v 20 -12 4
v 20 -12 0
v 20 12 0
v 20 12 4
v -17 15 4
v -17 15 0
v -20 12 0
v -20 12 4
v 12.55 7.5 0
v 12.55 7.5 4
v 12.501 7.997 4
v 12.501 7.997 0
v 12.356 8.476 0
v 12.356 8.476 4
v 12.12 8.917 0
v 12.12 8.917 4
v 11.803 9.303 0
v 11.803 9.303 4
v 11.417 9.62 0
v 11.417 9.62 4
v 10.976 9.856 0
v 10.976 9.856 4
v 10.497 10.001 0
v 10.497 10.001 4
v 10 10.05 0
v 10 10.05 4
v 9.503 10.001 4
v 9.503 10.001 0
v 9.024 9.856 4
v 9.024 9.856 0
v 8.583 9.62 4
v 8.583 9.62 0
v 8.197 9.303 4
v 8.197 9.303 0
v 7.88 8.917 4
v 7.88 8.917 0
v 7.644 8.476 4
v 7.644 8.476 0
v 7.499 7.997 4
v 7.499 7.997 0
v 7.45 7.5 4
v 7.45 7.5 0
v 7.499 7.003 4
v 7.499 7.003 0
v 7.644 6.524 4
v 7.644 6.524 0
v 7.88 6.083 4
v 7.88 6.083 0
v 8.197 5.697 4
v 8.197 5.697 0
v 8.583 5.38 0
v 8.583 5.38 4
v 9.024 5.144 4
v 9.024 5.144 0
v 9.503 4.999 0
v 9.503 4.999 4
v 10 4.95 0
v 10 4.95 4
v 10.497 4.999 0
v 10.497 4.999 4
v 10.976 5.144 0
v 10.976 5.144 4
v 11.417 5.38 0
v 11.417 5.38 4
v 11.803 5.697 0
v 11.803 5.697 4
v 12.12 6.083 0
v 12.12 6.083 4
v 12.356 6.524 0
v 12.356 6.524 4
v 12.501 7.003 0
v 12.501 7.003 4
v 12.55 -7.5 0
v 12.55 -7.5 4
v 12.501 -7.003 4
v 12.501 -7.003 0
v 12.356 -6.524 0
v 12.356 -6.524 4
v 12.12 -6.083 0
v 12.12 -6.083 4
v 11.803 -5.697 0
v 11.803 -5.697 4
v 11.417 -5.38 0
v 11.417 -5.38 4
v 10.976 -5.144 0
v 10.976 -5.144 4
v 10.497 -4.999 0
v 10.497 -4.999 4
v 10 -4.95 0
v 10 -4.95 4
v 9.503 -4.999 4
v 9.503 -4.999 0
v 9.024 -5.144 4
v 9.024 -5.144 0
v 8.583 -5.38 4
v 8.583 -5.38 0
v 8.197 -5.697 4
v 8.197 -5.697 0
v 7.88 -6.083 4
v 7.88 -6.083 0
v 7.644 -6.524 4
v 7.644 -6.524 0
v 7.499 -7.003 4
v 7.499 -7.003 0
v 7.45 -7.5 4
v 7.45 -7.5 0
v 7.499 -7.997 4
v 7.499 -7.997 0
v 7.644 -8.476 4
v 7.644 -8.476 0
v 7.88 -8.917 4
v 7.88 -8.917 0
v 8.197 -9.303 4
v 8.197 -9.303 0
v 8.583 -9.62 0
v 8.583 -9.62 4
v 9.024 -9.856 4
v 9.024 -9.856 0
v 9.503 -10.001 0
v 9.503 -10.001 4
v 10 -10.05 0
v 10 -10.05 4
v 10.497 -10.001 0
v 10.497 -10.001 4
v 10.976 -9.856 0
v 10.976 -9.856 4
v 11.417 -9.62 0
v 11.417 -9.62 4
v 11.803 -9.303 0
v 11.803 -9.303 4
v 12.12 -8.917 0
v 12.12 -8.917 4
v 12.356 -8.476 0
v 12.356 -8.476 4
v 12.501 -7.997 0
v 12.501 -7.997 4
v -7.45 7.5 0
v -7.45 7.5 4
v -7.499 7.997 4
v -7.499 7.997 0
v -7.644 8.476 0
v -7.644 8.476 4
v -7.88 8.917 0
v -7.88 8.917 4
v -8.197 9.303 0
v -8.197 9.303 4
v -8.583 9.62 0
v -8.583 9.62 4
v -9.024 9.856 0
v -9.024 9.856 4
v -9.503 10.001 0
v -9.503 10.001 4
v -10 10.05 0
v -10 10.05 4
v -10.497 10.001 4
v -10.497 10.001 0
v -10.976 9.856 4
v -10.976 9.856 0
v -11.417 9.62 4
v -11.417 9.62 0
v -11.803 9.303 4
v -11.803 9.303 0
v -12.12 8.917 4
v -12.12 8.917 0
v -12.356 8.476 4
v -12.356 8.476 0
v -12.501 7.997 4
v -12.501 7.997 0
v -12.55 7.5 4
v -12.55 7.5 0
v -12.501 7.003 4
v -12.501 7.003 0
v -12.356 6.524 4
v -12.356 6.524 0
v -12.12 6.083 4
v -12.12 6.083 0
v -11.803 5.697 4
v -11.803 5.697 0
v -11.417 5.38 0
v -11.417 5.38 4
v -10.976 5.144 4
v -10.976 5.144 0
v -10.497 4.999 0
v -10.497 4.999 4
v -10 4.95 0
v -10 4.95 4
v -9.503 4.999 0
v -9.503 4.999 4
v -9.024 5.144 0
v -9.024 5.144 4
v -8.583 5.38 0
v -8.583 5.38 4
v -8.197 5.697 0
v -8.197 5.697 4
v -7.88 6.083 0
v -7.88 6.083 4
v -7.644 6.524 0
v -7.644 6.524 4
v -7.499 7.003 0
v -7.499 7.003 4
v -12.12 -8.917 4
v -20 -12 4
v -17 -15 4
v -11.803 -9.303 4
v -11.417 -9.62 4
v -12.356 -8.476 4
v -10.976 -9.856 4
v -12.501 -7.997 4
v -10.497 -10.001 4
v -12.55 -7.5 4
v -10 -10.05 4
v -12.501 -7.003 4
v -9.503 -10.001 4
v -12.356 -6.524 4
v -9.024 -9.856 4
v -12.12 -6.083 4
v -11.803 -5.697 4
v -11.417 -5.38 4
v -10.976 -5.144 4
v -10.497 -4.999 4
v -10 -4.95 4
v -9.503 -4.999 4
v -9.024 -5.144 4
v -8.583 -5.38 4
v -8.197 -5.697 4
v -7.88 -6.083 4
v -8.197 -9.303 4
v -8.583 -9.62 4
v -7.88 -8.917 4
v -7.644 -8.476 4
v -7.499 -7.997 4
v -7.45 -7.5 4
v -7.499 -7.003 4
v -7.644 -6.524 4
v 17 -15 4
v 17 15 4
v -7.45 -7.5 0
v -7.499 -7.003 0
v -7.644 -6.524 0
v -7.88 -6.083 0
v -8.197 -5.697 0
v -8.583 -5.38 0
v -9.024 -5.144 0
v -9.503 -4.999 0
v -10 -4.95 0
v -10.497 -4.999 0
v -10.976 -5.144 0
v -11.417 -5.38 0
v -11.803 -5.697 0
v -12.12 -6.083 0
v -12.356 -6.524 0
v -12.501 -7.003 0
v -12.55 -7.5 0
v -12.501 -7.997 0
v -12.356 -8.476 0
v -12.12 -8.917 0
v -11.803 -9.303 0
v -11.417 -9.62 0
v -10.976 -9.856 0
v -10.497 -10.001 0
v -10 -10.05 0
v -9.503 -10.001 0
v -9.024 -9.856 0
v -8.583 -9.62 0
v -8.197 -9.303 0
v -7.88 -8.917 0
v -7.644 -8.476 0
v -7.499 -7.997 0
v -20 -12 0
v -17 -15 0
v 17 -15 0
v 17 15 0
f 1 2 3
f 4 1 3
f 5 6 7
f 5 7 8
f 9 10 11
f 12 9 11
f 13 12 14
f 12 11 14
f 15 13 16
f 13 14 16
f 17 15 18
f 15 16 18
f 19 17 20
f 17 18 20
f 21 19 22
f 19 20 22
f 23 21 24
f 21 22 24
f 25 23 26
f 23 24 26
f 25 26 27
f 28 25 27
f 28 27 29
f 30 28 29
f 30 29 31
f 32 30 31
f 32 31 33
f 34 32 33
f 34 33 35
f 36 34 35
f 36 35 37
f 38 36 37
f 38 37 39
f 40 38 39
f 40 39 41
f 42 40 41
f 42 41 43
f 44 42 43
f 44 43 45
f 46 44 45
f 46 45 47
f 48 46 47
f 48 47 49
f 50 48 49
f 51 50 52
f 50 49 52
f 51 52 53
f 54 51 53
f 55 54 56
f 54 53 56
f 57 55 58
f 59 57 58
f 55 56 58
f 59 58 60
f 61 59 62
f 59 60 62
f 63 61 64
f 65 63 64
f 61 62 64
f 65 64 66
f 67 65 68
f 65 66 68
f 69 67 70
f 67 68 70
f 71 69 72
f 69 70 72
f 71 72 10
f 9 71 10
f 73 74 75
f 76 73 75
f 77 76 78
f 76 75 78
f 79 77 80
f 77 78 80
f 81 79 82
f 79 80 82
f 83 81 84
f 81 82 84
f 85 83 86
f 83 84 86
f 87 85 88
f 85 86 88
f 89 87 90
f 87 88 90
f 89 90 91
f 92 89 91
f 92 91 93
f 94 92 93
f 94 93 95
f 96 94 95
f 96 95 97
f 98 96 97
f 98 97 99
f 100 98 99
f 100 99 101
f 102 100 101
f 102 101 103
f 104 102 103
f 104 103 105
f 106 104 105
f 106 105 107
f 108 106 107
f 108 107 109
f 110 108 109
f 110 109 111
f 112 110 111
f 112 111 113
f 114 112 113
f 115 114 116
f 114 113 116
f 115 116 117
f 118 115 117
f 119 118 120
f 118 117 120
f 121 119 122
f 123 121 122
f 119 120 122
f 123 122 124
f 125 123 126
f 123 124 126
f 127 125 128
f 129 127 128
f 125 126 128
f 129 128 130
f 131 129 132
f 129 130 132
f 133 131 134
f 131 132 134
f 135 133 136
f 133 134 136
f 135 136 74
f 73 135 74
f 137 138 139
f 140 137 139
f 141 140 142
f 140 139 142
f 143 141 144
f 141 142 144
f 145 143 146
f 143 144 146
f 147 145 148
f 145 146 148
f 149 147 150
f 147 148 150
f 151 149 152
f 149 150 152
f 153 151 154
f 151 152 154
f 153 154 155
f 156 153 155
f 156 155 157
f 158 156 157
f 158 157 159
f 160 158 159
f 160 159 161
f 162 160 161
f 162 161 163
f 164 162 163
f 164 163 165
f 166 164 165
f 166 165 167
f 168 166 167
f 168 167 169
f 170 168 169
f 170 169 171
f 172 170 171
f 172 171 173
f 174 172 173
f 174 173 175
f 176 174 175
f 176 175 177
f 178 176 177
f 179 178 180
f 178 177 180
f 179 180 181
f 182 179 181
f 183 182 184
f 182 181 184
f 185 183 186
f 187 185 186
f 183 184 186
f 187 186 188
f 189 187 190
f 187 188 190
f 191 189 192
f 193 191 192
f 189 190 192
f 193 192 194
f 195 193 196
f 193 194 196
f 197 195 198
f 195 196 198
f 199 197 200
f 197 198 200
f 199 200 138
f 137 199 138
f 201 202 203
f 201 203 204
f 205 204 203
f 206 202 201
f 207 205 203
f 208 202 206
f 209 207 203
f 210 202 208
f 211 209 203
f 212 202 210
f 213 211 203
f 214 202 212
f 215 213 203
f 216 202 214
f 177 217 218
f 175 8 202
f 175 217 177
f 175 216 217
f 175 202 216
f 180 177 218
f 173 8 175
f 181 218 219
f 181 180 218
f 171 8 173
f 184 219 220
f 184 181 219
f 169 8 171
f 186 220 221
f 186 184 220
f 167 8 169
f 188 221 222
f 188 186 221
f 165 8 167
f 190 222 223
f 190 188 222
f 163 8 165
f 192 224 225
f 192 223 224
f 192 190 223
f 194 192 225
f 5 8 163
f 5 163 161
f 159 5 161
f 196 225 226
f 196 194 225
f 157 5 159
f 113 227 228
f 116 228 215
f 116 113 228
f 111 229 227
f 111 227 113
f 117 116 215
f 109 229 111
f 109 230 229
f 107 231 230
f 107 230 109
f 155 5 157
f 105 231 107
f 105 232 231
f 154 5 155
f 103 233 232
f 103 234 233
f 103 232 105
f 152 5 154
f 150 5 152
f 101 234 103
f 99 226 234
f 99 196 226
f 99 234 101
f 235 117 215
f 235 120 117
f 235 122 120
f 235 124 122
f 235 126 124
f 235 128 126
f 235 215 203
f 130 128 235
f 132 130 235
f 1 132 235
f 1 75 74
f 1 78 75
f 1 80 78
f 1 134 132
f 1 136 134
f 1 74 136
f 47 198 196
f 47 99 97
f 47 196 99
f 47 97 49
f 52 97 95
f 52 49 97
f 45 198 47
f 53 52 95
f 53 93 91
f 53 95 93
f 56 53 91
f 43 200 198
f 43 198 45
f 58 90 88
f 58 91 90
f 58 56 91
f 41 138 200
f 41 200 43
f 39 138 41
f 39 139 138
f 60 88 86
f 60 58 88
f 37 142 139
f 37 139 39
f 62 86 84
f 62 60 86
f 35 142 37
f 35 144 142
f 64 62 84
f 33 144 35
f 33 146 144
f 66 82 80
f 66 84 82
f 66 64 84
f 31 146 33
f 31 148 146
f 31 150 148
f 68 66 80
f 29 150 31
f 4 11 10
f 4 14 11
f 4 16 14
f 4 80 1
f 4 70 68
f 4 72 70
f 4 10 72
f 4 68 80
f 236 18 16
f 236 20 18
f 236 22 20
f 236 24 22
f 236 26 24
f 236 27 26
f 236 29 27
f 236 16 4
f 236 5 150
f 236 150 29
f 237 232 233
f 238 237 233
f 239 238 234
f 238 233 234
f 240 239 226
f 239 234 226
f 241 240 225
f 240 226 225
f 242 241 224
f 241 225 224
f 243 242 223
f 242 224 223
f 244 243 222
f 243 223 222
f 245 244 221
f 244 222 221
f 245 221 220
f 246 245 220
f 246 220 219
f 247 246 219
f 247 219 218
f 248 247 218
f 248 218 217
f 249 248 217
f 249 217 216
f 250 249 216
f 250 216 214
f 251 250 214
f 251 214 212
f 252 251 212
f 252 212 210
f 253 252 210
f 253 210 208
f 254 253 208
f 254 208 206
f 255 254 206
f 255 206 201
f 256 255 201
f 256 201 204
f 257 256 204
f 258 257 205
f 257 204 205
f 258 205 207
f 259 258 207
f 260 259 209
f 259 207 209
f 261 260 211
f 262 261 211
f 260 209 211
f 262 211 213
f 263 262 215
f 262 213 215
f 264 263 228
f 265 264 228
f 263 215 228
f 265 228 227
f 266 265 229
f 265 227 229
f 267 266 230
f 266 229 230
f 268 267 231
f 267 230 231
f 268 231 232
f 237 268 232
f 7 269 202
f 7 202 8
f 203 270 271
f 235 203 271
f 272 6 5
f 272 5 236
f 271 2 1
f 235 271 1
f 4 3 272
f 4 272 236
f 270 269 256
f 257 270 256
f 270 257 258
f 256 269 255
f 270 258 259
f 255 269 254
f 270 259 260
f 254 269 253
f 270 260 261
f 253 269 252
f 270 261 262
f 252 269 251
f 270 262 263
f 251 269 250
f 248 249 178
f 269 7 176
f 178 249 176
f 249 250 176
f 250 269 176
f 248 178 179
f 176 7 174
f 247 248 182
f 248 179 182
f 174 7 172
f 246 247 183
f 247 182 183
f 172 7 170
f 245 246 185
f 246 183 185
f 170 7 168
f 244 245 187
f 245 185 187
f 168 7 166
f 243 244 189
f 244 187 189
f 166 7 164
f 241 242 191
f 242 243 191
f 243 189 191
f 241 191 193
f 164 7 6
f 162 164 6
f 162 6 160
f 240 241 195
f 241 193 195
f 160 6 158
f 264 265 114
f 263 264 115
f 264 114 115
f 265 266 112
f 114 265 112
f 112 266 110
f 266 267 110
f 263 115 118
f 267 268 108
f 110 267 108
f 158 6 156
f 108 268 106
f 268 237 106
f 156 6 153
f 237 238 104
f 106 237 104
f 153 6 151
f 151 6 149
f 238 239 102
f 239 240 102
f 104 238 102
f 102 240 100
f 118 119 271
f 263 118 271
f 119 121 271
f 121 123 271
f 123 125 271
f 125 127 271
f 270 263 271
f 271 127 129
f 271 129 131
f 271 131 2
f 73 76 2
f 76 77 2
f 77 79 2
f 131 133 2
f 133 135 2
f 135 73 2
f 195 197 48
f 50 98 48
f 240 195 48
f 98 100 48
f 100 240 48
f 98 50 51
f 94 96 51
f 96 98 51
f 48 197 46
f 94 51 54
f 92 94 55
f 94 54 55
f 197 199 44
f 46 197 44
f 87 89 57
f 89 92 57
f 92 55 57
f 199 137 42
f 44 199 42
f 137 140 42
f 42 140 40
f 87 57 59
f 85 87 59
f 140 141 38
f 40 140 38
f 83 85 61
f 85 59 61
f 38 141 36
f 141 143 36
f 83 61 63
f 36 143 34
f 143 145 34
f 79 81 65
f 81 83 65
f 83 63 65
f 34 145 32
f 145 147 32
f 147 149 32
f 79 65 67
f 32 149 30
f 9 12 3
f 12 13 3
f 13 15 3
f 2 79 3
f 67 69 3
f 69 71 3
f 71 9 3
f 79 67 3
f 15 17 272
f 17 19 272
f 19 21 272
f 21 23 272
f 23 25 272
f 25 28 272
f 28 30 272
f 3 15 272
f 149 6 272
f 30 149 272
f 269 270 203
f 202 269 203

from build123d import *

# Parameters (mm, degrees)
SKETCH1_W           = 40
SKETCH1_H           = 30
BOSS_EXTRUDE1_DEPTH = 4
SKETCH3_R           = 2.55
CUT_EXTRUDE2_DEPTH  = 26.317977802
CHAMFER1_SIZE       = 3
LPATTERN1_COUNT     = 2
LPATTERN1_PITCH     = 20


with BuildPart() as part:
    # Sketch1 → Boss-Extrude1 (new body)
    with BuildSketch(Plane.XY):
        Rectangle(SKETCH1_W, SKETCH1_H)
    extrude(amount=BOSS_EXTRUDE1_DEPTH)

    # Sketch3 → Cut-Extrude2 (cut, through all)
    with BuildSketch(Plane.XY.offset(4)):
        with Locations((10, 7.5)):
            Circle(SKETCH3_R)
        with Locations((10, -7.5)):
            Circle(SKETCH3_R)
    cut_extrude2 = extrude(amount=-CUT_EXTRUDE2_DEPTH, mode=Mode.SUBTRACT)

    # Chamfer1
    chamfer1_edges = [part.edges().sort_by_distance(p)[0] for p in [
        (20, -15, 2),
        (-20, -15, 2),
        (-20, 15, 2),
        (20, 15, 2),
    ]]
    chamfer(chamfer1_edges, length=CHAMFER1_SIZE)

    # LPattern1: Cut-Extrude2 ×2
    with Locations(*[(-i * LPATTERN1_PITCH, 0, 0) for i in range(1, LPATTERN1_COUNT)]):
        add(cut_extrude2, mode=Mode.SUBTRACT)


solid = part.part
